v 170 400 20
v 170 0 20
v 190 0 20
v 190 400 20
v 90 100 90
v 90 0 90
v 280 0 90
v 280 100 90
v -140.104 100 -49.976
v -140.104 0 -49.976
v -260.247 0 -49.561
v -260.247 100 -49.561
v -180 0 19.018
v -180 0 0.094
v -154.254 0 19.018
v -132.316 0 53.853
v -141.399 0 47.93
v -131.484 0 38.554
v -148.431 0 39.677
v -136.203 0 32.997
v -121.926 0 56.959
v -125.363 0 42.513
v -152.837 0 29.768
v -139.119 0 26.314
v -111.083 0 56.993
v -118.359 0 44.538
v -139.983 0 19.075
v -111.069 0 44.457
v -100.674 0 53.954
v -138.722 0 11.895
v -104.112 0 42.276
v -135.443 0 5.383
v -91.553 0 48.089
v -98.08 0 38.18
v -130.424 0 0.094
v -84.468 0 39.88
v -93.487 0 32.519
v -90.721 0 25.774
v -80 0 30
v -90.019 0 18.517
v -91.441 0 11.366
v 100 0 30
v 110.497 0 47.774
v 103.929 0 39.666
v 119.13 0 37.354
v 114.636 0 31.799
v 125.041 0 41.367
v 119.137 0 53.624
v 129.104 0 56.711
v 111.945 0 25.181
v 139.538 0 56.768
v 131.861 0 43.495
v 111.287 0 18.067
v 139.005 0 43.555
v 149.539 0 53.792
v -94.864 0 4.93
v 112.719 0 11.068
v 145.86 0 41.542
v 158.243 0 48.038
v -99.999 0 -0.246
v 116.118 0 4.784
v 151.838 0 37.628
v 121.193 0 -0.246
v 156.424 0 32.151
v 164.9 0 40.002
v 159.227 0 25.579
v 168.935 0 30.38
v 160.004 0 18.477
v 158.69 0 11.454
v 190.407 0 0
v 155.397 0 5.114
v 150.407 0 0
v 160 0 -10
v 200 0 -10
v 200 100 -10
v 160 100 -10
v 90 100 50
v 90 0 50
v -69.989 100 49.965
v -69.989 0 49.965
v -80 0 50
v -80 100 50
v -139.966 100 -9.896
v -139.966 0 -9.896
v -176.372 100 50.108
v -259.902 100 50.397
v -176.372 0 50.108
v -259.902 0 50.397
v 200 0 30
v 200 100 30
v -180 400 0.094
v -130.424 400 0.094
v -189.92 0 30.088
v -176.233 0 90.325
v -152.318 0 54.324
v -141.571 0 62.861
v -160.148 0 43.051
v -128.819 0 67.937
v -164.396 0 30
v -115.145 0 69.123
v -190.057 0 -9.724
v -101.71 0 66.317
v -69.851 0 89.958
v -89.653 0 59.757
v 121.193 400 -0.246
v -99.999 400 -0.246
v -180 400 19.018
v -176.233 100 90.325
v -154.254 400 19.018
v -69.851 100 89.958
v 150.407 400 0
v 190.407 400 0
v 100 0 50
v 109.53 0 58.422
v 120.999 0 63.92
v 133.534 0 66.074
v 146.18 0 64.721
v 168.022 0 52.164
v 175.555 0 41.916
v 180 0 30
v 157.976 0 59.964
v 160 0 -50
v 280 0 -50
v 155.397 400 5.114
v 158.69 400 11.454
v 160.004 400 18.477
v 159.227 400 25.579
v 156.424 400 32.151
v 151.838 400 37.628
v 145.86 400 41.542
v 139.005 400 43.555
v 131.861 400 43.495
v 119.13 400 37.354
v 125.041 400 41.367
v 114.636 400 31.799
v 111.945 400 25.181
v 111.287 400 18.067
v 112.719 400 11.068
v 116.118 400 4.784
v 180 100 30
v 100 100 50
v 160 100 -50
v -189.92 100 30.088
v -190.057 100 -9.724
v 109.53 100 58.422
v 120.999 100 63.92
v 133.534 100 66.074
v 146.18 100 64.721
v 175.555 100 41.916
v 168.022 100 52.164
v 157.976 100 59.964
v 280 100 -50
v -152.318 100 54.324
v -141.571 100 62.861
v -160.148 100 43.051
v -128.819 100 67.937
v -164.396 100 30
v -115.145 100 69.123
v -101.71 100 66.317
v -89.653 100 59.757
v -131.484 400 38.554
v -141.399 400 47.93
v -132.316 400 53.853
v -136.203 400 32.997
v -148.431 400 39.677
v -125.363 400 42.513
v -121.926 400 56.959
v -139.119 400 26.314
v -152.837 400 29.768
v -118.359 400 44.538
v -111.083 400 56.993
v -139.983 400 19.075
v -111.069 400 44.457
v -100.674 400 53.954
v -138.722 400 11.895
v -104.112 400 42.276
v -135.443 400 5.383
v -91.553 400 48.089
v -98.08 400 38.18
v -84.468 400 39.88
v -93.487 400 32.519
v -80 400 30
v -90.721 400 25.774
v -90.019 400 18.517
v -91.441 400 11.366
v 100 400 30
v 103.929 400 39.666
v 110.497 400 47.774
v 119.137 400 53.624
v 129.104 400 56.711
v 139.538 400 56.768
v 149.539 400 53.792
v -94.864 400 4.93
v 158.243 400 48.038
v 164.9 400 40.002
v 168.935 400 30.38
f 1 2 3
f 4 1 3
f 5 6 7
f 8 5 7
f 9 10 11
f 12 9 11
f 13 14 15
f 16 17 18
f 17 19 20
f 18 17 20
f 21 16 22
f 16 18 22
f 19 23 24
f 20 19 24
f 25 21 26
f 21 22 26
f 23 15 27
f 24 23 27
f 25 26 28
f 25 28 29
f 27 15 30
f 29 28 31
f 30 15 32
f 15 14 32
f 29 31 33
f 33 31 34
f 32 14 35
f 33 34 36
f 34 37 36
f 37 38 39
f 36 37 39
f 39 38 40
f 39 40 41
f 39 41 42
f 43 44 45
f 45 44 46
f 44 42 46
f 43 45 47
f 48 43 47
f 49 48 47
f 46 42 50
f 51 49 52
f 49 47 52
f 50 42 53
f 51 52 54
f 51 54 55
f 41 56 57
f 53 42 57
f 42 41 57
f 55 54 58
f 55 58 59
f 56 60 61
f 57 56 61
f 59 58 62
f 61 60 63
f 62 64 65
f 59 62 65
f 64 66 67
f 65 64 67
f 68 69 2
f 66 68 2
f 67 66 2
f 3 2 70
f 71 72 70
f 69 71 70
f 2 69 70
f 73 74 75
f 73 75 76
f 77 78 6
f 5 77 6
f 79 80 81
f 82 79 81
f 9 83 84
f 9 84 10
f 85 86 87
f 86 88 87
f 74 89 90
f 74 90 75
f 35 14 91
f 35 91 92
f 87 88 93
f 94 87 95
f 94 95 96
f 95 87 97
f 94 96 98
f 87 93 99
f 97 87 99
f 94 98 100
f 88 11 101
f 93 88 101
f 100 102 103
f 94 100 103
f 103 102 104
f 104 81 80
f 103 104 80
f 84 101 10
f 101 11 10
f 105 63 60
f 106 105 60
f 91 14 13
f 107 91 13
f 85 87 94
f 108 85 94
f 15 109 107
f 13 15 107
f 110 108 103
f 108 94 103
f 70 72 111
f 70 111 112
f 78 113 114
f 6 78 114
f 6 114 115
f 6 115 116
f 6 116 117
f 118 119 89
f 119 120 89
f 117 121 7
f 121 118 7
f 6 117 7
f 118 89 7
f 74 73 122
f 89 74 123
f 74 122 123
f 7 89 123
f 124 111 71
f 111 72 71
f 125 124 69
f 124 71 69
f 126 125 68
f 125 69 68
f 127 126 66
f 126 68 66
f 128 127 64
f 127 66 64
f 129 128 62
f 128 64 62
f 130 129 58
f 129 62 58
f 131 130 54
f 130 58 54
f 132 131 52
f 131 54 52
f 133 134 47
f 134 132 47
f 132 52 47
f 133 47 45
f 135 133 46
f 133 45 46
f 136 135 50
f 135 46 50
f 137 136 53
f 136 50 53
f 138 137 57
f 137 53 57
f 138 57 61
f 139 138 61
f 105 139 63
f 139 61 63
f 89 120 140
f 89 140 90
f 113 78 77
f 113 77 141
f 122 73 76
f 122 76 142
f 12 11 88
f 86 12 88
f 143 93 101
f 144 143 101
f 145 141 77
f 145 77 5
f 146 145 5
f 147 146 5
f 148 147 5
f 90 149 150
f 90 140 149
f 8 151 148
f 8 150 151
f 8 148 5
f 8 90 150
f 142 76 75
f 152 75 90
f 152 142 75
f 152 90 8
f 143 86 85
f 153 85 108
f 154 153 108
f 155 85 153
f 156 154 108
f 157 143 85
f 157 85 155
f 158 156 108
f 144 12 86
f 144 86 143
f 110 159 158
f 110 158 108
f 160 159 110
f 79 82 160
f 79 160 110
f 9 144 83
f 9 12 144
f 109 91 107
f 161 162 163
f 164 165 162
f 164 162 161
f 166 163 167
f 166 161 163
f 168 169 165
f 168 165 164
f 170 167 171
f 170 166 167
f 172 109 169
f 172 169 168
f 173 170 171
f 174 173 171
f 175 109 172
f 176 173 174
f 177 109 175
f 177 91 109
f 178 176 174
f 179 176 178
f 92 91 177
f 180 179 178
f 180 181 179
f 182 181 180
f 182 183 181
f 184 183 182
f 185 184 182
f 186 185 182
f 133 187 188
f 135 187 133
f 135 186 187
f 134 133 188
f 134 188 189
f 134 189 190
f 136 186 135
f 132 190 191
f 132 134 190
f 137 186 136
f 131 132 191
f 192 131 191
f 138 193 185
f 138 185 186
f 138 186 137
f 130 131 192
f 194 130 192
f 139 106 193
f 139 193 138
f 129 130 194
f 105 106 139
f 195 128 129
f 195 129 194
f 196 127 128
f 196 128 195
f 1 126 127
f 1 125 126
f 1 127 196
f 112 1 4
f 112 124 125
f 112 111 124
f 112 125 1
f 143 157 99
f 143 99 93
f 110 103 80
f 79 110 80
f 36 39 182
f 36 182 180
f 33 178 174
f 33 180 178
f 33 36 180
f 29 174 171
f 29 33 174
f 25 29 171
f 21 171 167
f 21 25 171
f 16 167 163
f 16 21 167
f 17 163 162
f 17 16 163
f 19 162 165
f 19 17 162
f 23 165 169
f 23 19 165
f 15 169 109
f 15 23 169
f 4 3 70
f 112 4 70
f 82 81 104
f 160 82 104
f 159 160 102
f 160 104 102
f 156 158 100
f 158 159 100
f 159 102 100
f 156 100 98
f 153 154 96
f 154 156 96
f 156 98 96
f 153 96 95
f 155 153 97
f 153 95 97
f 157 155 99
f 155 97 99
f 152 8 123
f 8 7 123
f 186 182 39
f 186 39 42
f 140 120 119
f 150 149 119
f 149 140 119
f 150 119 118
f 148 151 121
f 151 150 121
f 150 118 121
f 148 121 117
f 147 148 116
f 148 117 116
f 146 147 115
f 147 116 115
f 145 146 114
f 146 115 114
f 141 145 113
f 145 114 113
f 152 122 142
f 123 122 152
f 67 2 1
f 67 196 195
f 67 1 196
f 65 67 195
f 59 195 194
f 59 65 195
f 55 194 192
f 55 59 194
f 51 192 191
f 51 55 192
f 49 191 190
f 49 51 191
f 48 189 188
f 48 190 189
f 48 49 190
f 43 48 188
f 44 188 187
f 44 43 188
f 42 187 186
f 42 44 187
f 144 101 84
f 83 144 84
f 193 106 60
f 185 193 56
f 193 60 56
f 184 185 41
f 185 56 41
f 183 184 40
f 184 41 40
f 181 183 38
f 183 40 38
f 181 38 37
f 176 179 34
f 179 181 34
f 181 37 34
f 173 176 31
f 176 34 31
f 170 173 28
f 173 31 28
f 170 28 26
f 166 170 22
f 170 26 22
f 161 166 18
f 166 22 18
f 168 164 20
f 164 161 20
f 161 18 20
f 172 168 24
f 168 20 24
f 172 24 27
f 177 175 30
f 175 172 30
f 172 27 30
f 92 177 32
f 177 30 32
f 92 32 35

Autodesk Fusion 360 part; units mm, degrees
sketch "Sketch1" plane through (0, 0, 0) normal (0, 1, 0) x (1, 0, 0)
  line L0 (-80, -30) -> (100, -30)
  circle A0 centre (-114.9902, -19.7639) radius 25.0021
  circle A1 centre (135.6359, -19.403) radius 24.3858
  line L1 (-260.2482, 49.781) -> (-259.9022, -50.3969)
  line L2 (-259.9022, -50.3969) -> (-176.3717, -50.1084)
  line L3 (-176.3717, -50.1084) -> (-176.2328, -90.3254)
  line L4 (-176.2328, -90.3254) -> (-69.8506, -89.958)
  line L5 (-69.8506, -89.958) -> (-69.9887, -49.9654)
  line L6 (-69.9887, -49.9654) -> (-80, -50)
  line L7 (90, -50) -> (90, -90)
  line L8 (90, -90) -> (280, -90)
  line L9 (280, -90) -> (280, 50)
  line L10 (90, -50) -> (100, -50)
  arc A2 (-154.2538, -19.0176) -> (-80, -30) centre (-116.3853, -19.4949) ccw
  arc A3 (-164.3965, -30) -> (-80, -50) centre (-117.9562, -22.0992) ccw
  line L11 (-154.2538, -19.0176) -> (-176.3829, -19.0176)
  line L12 (-180, -0.0944) -> (-180, -19.0176)
  line L13 (-180, -19.0176) -> (-176.3829, -19.0176)
  line L14 (-180, -0.0944) -> (-130.4244, -0.0944)
  line L15 (121.1929, 0.2455) -> (-99.9993, 0.2455)
  arc A4 (100, -30) -> (170, -20) centre (134.5149, -21.6041) ccw
  arc A5 (100, -50) -> (180, -30) centre (135, -20) ccw
  line L16 (-164.3965, -30) -> (-189.9198, -30.0882)
  line L17 (-189.9198, -30.0882) -> (-190.0573, 9.7235)
  line L18 (-190.0573, 9.7235) -> (-139.9655, 9.8965)
  line L19 (-139.9655, 9.8965) -> (-140.1039, 49.9756)
  line L20 (-140.1039, 49.9756) -> (-260.2474, 49.5606)
  line L21 (150.4071, 0) -> (190.4071, 0)
  line L22 (170, -20) -> (190, -20)
  line L23 (190, -20) -> (190.4071, 0)
  line L24 (180, -30) -> (200, -30)
  line L25 (200, -30) -> (200, 10)
  line L26 (200, 10) -> (160, 10)
  line L27 (160, 10) -> (160, 50)
  line L28 (160, 50) -> (280, 50)
extrude "Extrude1" add sketch "Sketch1" along normal blind 100 contours L0 A0 A1 A2 L11 L12 L13 L14 L15 A4 L21 L22 L23 | L1 L2 L3 L4 L5 L6 A3 L16 L17 L18 L19 L20 | L7 L8 L9 L10 A5 L24 L25 L26 L27 L28 makes body 1 at (-236.7356, 0, -2.9624) makes body 2 at (47.4622, 33.3333, -0.2455) makes body 3 at (153.3333, 33.3333, 90)
extrude "Extrude2" add 1 faces at (40.4235, 100, 15.2743) along direction (0, 1, 0) blind 300 on bodies 2 bodies 2
